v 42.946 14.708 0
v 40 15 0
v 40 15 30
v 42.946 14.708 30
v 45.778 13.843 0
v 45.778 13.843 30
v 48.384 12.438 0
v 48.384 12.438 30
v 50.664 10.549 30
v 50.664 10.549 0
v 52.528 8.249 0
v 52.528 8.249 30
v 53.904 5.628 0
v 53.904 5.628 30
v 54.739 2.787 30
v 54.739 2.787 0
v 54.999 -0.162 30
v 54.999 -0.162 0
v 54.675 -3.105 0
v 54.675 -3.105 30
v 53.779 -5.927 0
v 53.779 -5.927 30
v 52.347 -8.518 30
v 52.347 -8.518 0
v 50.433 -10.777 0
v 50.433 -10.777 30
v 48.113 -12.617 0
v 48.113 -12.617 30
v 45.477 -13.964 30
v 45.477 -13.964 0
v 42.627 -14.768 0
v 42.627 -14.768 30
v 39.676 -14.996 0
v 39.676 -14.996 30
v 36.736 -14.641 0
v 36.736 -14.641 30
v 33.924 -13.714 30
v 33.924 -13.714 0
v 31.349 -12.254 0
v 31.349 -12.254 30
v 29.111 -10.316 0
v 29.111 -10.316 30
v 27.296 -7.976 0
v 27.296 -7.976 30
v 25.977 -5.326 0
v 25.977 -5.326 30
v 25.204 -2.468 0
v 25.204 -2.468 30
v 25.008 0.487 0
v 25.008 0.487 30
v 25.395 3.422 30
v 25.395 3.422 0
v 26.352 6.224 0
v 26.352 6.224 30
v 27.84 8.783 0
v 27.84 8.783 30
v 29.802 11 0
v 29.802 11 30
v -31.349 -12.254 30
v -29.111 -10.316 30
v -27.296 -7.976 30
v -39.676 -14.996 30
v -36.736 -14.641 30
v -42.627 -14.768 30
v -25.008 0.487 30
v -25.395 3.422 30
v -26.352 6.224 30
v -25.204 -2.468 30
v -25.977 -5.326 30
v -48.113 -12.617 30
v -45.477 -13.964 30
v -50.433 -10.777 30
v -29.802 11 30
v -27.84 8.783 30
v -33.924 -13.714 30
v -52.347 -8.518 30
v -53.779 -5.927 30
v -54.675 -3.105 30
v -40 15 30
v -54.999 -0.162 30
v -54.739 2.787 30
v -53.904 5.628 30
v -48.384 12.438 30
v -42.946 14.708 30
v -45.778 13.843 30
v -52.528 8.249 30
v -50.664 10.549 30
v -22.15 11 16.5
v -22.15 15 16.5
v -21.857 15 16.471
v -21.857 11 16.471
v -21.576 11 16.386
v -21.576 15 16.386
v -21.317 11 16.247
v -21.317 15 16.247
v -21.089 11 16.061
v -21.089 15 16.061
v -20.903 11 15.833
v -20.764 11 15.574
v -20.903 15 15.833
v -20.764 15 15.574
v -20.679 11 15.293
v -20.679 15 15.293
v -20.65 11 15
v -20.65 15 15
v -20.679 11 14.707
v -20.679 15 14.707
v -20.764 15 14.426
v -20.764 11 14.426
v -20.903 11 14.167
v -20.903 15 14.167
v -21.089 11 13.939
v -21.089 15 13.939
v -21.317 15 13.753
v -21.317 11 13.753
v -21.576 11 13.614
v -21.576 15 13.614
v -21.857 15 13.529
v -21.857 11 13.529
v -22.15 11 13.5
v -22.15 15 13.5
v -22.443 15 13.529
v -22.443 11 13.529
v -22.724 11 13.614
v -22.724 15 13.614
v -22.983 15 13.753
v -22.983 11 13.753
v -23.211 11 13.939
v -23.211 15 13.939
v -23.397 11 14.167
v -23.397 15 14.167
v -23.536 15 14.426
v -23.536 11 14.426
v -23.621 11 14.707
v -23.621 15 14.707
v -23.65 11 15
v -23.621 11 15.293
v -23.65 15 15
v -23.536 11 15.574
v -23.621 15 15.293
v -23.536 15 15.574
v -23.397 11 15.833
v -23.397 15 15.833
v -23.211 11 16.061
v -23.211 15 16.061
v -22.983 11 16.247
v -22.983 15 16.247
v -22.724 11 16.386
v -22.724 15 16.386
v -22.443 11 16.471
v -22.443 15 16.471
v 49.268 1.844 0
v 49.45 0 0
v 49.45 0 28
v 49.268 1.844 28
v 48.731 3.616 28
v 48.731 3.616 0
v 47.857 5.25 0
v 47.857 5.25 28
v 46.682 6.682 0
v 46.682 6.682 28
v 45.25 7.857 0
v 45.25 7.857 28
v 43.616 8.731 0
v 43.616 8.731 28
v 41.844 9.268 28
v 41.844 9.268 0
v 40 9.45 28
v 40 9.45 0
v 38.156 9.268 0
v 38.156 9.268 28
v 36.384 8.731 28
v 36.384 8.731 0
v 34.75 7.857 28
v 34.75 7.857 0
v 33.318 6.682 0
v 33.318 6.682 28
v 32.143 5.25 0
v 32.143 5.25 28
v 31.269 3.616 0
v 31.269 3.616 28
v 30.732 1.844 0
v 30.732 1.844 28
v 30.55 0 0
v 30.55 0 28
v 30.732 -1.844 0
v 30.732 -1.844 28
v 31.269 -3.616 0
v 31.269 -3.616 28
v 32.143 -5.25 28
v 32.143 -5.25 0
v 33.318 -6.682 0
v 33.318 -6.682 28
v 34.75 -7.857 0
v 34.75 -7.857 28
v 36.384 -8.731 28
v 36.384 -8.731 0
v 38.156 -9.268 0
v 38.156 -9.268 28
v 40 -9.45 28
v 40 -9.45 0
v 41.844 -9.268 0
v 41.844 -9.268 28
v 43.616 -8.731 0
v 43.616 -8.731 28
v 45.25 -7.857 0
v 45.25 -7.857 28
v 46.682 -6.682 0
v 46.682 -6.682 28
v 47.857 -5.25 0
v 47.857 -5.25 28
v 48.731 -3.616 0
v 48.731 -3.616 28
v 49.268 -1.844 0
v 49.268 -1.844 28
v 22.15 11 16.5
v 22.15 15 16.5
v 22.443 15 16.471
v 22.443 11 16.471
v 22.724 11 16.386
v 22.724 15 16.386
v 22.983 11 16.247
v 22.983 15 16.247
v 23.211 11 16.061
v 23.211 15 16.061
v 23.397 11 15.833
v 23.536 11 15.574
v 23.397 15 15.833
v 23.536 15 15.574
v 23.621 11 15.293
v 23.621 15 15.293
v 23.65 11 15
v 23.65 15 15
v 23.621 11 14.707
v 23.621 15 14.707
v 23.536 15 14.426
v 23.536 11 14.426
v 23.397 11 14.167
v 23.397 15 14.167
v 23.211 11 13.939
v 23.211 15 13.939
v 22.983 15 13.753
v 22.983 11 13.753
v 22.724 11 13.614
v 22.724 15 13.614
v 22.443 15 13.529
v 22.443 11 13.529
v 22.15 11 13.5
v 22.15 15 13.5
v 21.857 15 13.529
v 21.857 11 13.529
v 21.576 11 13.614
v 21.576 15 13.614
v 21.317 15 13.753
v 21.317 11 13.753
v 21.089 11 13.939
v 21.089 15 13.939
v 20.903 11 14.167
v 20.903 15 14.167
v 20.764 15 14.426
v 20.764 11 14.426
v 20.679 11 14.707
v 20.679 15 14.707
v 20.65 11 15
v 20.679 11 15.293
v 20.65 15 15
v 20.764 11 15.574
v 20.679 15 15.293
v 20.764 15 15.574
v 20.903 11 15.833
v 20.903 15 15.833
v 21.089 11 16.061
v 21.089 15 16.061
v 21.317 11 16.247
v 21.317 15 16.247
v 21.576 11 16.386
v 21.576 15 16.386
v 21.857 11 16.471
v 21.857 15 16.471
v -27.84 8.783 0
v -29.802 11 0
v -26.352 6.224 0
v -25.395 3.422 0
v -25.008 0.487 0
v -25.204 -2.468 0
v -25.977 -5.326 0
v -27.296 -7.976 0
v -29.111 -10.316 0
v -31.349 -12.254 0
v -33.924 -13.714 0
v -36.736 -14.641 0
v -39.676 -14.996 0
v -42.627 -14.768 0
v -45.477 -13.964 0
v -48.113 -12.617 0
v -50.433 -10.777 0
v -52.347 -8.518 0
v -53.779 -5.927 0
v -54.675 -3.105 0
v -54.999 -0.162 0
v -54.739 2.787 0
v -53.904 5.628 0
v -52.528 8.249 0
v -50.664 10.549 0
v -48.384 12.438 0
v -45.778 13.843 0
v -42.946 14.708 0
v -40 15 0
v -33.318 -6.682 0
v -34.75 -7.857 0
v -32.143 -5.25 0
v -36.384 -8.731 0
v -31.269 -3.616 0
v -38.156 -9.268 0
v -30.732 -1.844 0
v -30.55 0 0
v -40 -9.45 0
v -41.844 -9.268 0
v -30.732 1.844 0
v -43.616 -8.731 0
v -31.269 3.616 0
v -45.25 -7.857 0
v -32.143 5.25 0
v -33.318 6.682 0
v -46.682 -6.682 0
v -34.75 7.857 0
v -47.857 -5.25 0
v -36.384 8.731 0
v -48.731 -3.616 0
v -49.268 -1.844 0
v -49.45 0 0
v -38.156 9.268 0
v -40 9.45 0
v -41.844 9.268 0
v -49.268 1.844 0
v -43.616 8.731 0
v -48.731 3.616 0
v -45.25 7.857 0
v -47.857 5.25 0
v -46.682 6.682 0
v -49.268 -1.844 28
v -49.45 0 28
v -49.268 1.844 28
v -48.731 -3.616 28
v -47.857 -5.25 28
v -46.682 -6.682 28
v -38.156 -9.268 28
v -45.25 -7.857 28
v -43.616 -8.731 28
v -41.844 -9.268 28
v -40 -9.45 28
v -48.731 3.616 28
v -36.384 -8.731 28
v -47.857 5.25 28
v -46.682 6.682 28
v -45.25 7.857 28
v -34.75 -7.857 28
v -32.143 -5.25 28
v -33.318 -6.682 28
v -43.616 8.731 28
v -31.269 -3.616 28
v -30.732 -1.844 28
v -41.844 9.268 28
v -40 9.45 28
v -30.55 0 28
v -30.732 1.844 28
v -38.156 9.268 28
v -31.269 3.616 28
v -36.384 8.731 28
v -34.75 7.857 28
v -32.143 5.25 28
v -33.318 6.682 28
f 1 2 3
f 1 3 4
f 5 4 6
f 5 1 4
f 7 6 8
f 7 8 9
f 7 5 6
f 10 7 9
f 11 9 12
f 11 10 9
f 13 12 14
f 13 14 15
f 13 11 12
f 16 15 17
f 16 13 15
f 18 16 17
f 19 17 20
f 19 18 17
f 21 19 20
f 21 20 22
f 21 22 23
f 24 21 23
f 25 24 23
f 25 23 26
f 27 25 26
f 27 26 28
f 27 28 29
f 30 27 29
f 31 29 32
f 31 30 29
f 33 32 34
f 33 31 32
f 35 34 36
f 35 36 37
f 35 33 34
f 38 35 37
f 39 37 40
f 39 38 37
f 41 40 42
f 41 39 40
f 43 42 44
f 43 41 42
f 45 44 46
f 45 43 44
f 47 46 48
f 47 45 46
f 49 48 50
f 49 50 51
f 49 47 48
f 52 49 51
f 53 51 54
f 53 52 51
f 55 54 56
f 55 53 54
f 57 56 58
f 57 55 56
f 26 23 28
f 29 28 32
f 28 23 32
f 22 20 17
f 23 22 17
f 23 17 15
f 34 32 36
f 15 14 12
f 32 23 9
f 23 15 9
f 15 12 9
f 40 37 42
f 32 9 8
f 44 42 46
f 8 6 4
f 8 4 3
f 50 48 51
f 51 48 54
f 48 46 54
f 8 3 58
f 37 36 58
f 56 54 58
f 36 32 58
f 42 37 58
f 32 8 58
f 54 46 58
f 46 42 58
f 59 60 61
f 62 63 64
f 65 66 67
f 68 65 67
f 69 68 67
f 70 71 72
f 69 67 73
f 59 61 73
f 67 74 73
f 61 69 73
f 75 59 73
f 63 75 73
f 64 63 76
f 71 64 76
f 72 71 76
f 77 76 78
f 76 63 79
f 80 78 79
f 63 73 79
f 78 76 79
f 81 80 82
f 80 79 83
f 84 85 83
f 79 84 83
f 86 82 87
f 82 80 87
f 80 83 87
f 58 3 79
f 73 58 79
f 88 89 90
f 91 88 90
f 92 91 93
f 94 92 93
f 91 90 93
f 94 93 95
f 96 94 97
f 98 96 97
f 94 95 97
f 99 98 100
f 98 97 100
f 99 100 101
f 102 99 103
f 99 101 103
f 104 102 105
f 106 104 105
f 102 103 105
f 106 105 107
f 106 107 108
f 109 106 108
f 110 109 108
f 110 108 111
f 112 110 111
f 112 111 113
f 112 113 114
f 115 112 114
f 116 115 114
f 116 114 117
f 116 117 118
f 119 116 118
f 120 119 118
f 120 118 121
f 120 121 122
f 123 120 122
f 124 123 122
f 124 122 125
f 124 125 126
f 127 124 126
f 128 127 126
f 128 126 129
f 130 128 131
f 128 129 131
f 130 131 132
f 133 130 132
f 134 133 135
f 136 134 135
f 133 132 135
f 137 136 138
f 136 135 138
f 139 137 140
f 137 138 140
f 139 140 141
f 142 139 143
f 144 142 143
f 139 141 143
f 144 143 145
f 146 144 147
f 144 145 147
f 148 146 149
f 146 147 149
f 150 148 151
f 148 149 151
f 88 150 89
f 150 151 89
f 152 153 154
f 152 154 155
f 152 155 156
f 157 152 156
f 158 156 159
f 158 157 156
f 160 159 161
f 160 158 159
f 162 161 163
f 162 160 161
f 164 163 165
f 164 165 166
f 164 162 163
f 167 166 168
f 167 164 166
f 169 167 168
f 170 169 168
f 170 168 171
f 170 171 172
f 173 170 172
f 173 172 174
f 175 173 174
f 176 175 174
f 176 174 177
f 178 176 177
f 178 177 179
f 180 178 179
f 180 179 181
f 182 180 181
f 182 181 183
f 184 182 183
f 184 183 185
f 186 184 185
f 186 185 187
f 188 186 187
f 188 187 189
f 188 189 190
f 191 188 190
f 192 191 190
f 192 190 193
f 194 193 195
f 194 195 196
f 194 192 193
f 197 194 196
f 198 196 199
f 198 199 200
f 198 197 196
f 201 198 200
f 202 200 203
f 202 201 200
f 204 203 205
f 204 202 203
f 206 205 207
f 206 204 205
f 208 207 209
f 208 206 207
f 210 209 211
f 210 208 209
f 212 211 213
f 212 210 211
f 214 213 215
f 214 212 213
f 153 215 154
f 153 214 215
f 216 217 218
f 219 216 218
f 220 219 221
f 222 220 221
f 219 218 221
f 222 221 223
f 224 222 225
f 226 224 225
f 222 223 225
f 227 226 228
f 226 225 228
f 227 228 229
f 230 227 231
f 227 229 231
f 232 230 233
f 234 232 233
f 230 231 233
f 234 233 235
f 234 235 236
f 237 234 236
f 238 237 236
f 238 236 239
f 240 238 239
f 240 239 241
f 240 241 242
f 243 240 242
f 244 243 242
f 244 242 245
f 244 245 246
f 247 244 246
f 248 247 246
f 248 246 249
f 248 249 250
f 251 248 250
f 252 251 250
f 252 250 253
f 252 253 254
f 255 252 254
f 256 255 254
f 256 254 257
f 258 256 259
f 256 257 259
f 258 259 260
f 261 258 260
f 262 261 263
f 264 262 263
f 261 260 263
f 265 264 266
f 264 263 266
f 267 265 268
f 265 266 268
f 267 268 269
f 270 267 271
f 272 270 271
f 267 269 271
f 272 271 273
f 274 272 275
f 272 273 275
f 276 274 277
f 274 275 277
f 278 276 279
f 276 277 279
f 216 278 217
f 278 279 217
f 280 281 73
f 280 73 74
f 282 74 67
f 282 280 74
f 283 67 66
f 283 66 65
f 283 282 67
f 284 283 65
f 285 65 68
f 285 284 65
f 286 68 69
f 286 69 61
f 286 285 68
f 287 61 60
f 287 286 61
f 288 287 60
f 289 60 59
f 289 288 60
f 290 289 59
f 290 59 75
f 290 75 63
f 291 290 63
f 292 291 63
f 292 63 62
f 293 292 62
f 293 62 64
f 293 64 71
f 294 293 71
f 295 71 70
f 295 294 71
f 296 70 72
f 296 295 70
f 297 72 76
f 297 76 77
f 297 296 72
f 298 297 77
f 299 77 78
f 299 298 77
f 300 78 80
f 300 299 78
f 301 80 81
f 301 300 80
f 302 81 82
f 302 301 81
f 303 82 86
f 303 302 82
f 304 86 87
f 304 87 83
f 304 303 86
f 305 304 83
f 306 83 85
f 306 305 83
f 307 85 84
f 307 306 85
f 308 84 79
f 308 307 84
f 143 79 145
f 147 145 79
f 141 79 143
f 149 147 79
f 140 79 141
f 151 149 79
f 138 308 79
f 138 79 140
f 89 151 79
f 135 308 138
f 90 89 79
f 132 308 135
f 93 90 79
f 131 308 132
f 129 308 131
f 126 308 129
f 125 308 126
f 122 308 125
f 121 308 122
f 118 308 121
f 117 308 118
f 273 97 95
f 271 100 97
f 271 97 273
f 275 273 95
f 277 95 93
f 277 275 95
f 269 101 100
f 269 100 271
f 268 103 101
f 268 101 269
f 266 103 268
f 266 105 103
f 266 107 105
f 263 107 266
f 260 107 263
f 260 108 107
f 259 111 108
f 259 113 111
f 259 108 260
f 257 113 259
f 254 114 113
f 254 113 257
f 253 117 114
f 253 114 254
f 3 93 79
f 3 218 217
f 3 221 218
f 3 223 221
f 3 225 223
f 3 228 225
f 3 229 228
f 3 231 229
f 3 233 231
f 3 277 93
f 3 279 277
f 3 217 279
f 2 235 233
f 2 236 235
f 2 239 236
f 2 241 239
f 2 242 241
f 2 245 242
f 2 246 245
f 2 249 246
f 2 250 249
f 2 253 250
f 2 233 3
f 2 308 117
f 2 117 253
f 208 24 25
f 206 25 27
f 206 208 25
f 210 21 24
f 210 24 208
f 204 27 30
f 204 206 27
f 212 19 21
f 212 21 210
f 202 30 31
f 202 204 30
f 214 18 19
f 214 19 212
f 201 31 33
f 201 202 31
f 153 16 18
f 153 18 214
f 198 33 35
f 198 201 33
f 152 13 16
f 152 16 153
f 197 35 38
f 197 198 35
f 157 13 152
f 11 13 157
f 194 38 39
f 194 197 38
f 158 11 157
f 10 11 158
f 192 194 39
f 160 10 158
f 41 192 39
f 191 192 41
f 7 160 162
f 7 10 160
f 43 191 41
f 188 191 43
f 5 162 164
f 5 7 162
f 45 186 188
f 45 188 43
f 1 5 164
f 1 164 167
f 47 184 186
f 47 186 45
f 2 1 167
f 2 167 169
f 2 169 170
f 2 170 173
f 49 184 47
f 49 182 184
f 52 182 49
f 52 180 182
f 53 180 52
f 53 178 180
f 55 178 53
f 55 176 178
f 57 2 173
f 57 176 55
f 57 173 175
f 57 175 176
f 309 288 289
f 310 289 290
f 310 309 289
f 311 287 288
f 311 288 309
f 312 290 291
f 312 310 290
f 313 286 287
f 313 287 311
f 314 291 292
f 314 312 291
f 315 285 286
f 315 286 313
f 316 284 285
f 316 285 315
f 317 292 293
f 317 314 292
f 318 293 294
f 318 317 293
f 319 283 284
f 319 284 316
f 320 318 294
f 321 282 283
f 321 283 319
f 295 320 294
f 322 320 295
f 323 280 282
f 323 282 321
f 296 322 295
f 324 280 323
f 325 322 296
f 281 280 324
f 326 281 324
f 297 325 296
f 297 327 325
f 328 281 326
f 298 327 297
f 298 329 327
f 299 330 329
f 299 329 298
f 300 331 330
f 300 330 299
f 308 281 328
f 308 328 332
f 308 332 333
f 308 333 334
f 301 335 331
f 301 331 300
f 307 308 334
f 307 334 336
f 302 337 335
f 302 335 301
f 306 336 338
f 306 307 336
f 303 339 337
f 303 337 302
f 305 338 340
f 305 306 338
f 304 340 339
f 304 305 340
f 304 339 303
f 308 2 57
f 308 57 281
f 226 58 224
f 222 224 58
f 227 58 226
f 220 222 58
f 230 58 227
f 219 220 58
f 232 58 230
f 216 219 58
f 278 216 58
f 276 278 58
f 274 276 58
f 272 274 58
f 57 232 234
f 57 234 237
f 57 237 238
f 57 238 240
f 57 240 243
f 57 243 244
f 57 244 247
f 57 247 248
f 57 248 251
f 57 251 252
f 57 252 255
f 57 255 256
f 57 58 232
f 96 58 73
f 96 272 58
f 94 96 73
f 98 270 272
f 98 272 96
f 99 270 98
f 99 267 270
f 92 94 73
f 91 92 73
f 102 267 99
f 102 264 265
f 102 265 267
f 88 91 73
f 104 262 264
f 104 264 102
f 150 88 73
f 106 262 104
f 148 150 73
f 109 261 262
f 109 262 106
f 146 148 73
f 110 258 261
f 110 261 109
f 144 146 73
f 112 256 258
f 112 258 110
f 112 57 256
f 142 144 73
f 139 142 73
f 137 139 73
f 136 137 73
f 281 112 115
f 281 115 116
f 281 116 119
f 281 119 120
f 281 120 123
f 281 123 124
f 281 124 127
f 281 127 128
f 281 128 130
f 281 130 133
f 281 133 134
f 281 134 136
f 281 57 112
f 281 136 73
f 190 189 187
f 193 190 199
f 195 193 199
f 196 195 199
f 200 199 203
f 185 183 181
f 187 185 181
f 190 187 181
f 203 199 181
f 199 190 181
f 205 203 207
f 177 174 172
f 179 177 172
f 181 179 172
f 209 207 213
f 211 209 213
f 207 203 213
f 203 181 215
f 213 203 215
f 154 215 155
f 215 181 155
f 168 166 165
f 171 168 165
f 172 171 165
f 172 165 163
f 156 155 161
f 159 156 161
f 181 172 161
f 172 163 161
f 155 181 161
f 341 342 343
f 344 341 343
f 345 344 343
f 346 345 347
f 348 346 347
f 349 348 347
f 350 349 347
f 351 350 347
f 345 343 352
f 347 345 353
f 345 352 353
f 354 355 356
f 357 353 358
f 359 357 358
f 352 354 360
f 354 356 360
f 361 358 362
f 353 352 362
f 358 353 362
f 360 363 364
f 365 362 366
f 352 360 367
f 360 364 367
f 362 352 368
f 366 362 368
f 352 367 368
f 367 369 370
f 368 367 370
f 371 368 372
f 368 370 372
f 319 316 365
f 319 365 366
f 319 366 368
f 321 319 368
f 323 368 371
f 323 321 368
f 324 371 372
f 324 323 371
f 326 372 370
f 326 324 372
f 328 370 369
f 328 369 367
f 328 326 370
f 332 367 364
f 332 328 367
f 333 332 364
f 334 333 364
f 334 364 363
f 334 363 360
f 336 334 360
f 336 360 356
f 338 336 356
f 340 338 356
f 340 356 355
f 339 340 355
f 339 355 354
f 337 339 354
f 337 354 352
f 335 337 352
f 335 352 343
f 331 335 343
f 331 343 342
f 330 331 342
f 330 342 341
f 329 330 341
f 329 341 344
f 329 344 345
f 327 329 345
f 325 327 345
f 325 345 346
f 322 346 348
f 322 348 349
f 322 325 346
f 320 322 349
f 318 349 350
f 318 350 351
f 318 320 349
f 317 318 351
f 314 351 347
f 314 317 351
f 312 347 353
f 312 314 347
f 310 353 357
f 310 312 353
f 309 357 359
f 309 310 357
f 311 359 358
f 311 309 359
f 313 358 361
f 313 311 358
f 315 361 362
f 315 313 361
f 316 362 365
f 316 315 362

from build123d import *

# Parameters (mm, degrees)
SKETCH1_R           = 9.45
BOSS_EXTRUDE1_DEPTH = 30
SKETCH3_R           = 1.5
CUT_EXTRUDE1_DEPTH  = 6
BOSS_EXTRUDE2_START = -2
SKETCH5_R           = 9.45
BOSS_EXTRUDE2_DEPTH = 2


with BuildPart() as part:
    # Sketch1 → Boss-Extrude1 (new body)
    with BuildSketch(Plane.XY):
        with BuildLine():
            Line((-40, 15), (40, 15))
            ThreePointArc((40, 15), (45.476992863, -13.964331319), (29.802327604, 11.00033989))
            Line((29.802327604, 11.00033989), (-29.802327604, 11.00033989))
            ThreePointArc((-29.802327604, 11.00033989), (-45.476992863, -13.964331319), (-40, 15))
        make_face()
        with Locations((-40, 0)):
            Circle(SKETCH1_R, mode=Mode.SUBTRACT)
        with Locations((40, 0)):
            Circle(SKETCH1_R, mode=Mode.SUBTRACT)
    extrude(amount=BOSS_EXTRUDE1_DEPTH)

    # Sketch3 → Cut-Extrude1 (cut)
    with BuildSketch(Plane(origin=(0, 15, 0), x_dir=(1, 0, 0), z_dir=(0, 1, 0))):
        with Locations(Location((-22.15, -15, 0), (0, 0, 270))):
            Circle(SKETCH3_R)
        with Locations(Location((22.15, -15, 0), (0, 0, 270))):
            Circle(SKETCH3_R)
    extrude(amount=-CUT_EXTRUDE1_DEPTH, mode=Mode.SUBTRACT)

    # Sketch5 → Boss-Extrude2 (add)
    with BuildSketch(Plane.XY.offset(30).offset(BOSS_EXTRUDE2_START)):
        with Locations((-40, 0)):
            Circle(SKETCH5_R)
        with Locations((40, 0)):
            Circle(SKETCH5_R)
    extrude(amount=BOSS_EXTRUDE2_DEPTH)


solid = part.part
